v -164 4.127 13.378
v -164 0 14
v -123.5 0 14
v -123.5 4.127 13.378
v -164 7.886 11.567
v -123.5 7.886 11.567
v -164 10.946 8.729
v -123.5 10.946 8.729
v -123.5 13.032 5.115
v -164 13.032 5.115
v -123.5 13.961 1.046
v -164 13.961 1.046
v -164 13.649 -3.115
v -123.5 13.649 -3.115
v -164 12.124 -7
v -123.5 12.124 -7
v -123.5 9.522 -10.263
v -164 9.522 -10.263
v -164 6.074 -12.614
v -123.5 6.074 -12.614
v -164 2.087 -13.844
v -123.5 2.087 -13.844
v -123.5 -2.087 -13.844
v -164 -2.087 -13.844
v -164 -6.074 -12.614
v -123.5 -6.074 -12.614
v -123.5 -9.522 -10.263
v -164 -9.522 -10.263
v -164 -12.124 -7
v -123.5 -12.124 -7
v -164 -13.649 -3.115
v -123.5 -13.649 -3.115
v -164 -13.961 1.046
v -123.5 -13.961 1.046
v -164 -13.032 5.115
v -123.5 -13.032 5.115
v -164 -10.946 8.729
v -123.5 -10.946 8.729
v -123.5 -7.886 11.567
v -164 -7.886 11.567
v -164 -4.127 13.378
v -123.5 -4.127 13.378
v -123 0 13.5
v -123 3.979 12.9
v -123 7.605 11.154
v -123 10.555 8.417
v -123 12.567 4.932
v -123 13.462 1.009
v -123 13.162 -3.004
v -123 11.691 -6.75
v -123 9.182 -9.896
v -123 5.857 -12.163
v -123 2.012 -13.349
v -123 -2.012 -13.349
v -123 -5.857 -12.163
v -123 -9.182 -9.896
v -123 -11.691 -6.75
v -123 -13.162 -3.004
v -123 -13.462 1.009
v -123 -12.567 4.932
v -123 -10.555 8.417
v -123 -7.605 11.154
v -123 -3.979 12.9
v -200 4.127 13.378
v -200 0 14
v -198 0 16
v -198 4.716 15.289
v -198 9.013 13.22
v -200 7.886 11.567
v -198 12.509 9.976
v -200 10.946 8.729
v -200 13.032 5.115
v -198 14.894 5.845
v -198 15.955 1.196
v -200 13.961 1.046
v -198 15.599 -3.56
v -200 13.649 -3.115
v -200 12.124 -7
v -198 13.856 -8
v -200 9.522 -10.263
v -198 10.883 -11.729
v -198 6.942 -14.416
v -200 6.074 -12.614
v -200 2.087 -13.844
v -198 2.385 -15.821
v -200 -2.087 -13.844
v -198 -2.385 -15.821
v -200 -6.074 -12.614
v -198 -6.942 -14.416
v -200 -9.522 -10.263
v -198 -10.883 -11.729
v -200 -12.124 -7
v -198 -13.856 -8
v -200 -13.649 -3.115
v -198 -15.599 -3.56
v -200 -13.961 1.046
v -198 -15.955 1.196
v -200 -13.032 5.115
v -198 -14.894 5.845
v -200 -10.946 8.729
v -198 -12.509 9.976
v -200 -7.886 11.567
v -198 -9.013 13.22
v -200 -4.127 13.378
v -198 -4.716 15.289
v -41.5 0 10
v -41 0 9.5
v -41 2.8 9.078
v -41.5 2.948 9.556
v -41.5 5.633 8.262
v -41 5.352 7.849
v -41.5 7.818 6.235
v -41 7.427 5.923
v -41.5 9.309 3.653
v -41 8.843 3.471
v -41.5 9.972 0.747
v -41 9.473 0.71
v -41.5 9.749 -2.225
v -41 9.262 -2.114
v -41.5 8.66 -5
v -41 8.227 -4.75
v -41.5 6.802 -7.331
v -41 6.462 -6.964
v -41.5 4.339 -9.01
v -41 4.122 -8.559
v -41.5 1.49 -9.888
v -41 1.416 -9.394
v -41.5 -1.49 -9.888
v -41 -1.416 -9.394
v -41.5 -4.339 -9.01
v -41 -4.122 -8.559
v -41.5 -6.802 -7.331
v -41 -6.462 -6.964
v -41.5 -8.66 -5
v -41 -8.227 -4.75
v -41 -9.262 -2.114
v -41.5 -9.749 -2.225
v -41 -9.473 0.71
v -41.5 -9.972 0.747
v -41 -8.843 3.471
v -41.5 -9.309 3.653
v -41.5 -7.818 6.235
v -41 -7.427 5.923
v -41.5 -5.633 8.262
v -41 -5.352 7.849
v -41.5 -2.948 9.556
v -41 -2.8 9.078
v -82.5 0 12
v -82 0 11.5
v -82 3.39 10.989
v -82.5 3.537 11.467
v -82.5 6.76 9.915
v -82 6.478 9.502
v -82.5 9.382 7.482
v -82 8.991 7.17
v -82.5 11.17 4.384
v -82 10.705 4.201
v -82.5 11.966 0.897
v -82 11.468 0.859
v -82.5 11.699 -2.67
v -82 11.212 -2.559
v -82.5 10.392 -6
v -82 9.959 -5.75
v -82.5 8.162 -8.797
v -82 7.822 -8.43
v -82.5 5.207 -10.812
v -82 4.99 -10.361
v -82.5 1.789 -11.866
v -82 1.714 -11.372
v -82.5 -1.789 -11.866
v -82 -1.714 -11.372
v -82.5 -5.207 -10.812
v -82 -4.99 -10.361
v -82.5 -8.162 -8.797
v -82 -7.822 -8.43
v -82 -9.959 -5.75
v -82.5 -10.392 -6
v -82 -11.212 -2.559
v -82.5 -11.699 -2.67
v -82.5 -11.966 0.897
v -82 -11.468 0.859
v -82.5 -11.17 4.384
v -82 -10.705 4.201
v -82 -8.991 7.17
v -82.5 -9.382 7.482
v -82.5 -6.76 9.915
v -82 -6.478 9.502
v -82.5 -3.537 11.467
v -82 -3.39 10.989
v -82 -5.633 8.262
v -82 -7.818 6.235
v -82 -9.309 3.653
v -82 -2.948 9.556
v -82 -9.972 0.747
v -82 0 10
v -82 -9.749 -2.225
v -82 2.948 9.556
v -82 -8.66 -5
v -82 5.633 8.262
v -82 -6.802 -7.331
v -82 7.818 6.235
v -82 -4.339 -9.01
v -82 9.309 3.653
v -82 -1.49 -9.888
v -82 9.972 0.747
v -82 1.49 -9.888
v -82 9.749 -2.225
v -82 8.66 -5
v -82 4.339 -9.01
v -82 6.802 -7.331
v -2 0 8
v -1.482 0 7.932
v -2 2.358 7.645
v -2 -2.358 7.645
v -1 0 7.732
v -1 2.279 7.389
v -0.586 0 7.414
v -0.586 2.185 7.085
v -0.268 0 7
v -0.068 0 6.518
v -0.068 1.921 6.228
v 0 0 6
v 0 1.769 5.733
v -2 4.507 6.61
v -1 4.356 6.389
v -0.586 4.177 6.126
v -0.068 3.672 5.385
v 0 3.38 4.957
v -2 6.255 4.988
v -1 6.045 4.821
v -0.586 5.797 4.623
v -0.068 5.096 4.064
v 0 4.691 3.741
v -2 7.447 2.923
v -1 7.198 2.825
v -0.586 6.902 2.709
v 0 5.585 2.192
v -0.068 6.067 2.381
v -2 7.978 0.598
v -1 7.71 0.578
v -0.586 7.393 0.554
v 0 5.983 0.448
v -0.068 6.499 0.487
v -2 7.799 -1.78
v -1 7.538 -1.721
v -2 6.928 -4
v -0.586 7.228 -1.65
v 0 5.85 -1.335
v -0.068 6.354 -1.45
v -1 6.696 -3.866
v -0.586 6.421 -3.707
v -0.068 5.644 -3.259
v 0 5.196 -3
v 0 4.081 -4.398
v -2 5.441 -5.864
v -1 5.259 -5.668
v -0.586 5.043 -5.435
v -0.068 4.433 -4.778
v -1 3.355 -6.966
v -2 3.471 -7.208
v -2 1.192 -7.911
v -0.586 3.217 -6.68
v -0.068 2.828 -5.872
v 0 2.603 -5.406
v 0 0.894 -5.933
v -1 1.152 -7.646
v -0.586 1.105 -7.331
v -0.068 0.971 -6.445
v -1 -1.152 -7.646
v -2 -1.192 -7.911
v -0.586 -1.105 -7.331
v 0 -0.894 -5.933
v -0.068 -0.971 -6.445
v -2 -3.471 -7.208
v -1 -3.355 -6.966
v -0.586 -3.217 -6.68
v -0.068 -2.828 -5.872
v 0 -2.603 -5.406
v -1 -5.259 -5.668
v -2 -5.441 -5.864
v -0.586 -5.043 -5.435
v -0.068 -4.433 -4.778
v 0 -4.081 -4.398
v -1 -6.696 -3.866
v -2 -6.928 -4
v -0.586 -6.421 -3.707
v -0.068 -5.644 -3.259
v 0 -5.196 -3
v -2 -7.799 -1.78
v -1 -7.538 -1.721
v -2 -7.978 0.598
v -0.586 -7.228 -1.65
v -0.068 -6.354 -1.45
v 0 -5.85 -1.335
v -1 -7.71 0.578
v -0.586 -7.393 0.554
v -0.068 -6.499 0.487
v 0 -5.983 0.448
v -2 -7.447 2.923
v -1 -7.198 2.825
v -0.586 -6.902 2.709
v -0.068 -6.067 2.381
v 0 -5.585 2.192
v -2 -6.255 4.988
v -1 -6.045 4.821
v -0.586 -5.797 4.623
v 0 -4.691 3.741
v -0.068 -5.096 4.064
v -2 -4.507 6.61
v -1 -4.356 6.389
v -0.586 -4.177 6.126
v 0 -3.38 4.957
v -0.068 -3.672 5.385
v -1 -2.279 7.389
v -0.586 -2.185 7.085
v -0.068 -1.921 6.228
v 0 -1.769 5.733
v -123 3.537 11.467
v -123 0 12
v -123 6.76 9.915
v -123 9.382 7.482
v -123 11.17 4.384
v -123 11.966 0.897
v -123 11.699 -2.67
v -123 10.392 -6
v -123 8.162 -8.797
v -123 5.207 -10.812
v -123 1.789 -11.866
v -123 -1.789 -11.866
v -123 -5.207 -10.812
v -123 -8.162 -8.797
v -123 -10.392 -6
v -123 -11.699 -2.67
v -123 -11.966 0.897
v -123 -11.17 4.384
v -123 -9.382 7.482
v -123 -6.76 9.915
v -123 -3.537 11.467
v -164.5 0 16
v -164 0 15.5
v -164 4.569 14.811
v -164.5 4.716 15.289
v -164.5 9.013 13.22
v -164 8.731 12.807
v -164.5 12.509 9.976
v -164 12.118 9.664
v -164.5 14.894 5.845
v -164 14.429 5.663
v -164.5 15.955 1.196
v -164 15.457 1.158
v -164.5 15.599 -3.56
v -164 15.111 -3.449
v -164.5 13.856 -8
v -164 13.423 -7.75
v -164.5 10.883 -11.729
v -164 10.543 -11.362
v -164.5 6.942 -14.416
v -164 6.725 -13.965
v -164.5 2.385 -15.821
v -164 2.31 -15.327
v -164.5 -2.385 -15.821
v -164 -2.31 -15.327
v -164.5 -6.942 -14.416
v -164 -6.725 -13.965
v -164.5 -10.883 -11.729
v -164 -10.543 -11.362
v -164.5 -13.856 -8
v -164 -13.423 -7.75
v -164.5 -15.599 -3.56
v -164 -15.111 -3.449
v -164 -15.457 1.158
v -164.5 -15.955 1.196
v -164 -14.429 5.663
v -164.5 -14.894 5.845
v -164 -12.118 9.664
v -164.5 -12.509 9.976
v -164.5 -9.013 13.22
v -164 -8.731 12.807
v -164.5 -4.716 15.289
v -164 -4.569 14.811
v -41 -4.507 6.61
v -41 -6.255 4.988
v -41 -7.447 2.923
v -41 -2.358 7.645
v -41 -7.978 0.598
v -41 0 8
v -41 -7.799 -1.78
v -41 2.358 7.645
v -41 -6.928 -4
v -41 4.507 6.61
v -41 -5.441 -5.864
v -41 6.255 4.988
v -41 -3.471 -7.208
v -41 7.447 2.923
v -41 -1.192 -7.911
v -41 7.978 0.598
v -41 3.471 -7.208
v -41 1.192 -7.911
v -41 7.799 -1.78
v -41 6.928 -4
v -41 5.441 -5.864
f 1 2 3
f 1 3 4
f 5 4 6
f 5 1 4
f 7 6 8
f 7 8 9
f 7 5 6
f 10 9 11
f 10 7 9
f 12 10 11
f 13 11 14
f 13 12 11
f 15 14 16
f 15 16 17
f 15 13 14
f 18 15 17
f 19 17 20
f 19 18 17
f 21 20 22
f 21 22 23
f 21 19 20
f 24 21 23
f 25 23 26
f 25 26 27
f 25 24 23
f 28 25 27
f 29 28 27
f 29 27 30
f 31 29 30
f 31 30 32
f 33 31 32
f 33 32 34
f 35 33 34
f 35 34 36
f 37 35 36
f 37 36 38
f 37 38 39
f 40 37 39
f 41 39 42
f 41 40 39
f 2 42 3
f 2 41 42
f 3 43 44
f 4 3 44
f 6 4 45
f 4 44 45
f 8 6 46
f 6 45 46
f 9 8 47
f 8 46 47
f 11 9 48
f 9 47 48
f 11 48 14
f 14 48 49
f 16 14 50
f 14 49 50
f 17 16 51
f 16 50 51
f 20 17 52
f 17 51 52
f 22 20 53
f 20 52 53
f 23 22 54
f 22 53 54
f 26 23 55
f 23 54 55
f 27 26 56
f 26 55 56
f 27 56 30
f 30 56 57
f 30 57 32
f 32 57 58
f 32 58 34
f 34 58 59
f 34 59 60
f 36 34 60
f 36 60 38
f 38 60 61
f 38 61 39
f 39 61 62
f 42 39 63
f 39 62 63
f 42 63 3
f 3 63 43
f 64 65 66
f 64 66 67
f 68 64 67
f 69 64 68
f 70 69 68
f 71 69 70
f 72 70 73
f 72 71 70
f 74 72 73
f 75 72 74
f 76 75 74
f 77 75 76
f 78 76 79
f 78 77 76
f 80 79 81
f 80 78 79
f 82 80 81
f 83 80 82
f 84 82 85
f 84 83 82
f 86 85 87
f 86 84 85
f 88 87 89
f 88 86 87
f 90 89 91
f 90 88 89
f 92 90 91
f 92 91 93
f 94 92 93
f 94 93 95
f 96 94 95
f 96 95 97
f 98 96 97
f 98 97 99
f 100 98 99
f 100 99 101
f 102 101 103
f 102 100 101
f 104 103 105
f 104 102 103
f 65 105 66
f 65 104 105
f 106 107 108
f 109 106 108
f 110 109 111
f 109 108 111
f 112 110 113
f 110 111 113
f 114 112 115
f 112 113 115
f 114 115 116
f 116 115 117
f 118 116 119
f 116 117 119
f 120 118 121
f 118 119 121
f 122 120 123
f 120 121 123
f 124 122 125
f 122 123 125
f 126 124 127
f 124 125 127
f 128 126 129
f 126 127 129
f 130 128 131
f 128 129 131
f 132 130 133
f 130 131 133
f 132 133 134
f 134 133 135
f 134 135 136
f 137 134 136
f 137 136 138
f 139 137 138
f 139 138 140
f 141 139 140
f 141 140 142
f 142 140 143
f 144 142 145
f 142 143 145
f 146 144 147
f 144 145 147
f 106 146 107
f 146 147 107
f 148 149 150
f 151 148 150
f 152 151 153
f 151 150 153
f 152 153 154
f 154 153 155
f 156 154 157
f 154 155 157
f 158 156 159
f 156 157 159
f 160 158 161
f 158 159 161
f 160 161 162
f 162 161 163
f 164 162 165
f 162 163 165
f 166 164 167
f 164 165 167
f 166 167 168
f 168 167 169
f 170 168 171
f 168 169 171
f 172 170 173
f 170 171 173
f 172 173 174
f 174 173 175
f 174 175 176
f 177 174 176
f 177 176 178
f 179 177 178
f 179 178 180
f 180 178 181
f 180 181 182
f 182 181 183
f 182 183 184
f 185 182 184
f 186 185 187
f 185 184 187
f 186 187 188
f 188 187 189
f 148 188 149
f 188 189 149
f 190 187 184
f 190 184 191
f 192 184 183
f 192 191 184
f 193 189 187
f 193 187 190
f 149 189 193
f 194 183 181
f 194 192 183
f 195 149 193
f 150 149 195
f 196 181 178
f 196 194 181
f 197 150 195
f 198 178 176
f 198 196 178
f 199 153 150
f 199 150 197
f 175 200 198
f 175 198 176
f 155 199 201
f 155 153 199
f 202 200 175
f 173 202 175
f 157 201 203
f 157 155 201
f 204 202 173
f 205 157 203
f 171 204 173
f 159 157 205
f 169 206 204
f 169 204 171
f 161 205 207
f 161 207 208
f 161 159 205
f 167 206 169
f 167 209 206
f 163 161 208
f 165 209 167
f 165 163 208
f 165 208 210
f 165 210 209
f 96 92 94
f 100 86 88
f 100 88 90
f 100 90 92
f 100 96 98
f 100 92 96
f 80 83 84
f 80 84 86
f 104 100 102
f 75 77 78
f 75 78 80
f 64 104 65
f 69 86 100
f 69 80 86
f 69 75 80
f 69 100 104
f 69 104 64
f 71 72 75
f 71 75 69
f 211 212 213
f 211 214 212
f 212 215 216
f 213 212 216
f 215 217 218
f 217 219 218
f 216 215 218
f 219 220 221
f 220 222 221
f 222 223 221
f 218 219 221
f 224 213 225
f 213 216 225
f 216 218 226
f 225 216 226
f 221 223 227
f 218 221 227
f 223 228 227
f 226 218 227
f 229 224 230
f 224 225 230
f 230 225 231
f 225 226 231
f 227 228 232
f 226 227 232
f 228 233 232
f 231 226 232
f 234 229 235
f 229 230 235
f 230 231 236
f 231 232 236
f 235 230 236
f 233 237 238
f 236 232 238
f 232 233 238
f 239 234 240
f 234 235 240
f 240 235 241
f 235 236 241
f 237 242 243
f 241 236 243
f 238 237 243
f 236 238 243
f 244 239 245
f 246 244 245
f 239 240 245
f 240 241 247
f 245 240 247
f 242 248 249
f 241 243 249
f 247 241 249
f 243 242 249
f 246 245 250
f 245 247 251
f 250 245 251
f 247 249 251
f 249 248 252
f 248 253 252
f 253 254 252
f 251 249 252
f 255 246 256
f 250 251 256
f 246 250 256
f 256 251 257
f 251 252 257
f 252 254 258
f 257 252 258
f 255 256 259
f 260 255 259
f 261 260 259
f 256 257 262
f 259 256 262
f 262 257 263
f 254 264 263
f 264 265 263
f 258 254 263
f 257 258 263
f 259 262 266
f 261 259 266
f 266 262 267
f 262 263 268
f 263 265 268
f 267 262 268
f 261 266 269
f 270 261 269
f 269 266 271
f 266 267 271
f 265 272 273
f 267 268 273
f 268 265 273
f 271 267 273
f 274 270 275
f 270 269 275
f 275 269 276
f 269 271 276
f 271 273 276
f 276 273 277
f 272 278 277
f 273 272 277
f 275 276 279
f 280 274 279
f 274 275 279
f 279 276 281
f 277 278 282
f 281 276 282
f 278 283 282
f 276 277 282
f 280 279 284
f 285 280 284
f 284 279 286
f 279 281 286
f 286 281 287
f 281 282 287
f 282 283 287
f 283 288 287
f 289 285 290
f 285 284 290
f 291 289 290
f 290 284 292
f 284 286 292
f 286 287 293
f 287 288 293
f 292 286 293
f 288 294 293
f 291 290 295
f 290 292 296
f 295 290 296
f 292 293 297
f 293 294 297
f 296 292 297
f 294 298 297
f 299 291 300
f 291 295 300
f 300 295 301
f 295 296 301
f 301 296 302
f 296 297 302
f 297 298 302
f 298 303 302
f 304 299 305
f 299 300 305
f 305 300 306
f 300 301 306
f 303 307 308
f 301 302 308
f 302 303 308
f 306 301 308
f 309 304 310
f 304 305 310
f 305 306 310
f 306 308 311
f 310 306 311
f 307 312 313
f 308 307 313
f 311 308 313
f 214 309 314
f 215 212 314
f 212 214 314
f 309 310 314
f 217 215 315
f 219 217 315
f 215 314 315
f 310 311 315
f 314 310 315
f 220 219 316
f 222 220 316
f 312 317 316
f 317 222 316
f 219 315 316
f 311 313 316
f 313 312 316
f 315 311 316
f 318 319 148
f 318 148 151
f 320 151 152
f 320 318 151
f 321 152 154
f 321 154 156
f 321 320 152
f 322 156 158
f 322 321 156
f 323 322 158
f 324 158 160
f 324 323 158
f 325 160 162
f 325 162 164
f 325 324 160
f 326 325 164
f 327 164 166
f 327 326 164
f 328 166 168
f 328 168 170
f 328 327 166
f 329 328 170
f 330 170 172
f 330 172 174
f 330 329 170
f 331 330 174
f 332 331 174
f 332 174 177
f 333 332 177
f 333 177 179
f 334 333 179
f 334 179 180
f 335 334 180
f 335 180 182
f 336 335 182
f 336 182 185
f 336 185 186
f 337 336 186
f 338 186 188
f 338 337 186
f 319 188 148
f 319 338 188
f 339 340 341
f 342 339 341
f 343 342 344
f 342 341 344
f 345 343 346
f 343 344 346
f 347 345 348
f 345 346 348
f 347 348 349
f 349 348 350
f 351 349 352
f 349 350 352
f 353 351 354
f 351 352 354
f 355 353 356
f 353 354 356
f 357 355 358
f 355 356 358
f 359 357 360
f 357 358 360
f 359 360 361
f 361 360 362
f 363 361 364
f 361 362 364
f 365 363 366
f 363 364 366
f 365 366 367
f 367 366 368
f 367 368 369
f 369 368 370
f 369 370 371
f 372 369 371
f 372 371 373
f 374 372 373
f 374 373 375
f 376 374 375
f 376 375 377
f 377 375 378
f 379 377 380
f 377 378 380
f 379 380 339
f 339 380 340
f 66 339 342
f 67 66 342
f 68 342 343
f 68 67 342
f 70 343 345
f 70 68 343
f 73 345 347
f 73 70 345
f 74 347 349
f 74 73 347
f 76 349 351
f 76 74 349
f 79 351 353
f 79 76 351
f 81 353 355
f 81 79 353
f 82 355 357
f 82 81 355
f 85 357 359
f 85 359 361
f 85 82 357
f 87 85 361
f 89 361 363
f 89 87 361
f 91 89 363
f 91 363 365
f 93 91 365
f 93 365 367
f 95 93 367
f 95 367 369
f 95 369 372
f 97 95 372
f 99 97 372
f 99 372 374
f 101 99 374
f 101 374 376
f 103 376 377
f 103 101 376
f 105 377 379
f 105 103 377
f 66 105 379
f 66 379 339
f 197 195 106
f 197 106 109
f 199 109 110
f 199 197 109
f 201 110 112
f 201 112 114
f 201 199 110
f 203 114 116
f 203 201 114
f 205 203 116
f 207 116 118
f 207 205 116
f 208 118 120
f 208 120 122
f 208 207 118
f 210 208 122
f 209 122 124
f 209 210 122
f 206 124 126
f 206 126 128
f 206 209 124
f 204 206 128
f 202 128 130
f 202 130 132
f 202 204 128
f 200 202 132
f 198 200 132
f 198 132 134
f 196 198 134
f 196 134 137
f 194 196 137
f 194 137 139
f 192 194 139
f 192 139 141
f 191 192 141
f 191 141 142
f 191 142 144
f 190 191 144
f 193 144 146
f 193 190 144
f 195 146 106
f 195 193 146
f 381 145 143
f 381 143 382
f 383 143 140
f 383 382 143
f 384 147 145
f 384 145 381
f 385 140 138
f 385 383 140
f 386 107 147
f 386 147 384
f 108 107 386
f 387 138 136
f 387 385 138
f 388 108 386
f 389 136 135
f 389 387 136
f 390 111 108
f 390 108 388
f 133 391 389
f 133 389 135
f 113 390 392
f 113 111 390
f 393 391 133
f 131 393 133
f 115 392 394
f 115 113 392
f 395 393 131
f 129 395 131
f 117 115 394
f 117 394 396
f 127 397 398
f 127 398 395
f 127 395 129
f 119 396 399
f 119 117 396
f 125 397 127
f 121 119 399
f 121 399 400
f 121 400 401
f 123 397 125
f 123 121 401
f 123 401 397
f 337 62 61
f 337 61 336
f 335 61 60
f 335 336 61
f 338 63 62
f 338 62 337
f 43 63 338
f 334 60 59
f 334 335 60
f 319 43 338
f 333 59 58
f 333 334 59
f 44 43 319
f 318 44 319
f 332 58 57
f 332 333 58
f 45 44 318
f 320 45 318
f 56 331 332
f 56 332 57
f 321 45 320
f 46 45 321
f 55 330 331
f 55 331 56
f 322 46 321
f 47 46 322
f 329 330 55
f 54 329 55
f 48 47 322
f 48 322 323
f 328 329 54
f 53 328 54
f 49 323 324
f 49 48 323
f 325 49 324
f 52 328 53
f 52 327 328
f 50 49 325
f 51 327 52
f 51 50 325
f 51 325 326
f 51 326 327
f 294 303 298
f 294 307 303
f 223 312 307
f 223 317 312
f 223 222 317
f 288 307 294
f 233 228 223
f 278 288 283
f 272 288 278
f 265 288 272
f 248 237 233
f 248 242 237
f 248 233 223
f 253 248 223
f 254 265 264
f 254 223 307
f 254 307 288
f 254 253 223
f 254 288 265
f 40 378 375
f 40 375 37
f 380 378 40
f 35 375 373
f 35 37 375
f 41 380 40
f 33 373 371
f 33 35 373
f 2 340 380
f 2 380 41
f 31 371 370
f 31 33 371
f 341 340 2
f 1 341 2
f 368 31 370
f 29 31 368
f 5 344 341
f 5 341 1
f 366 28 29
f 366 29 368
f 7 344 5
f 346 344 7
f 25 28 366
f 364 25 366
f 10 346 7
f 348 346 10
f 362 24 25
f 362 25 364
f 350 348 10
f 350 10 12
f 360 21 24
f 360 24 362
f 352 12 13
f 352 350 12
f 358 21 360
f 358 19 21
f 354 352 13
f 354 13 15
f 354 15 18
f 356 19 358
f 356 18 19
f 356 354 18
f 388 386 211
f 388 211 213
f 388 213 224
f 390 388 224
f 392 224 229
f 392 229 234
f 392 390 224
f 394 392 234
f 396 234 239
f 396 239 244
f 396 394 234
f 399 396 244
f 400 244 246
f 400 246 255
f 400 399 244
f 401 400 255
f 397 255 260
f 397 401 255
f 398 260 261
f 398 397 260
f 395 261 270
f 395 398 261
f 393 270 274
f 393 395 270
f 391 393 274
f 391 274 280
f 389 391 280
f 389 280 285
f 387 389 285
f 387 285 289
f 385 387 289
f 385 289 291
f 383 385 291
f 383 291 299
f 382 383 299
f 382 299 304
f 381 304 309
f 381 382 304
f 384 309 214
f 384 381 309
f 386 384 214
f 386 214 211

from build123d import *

# Parameters (mm, degrees)
F2_SIZE = 2
F3_SIZE = 0.5
F4_R    = 2


with BuildPart() as f1:
    # F0 (on Front) → F1 (revolve)
    with BuildSketch(Plane.XZ):
        Polygon((-200, 0), (0, 0), (0, 8), (-41, 8), (-41, 10), (-82, 10), (-82, 12), (-123, 12), (-123, 14), (-164, 14), (-164, 16), (-200, 16), align=None)
    revolve(axis=Axis((-100, 0, 0), (-1, 0, 0)))

    # F2
    f2_edges = [f1.edges().sort_by_distance(p)[0] for p in [
        (-200, 0, -16),
    ]]
    chamfer(f2_edges, length=F2_SIZE)

    # F3
    f3_edges = [f1.edges().sort_by_distance(p)[0] for p in [
        (-164, 0, -16),
        (-123, 0, -14),
        (-82, 0, -12),
        (-41, 0, -10),
    ]]
    chamfer(f3_edges, length=F3_SIZE)

    # F4
    f4_edges = [f1.edges().sort_by_distance(p)[0] for p in [
        (0, 0, -8),
    ]]
    fillet(f4_edges, radius=F4_R)


solid = f1.part
